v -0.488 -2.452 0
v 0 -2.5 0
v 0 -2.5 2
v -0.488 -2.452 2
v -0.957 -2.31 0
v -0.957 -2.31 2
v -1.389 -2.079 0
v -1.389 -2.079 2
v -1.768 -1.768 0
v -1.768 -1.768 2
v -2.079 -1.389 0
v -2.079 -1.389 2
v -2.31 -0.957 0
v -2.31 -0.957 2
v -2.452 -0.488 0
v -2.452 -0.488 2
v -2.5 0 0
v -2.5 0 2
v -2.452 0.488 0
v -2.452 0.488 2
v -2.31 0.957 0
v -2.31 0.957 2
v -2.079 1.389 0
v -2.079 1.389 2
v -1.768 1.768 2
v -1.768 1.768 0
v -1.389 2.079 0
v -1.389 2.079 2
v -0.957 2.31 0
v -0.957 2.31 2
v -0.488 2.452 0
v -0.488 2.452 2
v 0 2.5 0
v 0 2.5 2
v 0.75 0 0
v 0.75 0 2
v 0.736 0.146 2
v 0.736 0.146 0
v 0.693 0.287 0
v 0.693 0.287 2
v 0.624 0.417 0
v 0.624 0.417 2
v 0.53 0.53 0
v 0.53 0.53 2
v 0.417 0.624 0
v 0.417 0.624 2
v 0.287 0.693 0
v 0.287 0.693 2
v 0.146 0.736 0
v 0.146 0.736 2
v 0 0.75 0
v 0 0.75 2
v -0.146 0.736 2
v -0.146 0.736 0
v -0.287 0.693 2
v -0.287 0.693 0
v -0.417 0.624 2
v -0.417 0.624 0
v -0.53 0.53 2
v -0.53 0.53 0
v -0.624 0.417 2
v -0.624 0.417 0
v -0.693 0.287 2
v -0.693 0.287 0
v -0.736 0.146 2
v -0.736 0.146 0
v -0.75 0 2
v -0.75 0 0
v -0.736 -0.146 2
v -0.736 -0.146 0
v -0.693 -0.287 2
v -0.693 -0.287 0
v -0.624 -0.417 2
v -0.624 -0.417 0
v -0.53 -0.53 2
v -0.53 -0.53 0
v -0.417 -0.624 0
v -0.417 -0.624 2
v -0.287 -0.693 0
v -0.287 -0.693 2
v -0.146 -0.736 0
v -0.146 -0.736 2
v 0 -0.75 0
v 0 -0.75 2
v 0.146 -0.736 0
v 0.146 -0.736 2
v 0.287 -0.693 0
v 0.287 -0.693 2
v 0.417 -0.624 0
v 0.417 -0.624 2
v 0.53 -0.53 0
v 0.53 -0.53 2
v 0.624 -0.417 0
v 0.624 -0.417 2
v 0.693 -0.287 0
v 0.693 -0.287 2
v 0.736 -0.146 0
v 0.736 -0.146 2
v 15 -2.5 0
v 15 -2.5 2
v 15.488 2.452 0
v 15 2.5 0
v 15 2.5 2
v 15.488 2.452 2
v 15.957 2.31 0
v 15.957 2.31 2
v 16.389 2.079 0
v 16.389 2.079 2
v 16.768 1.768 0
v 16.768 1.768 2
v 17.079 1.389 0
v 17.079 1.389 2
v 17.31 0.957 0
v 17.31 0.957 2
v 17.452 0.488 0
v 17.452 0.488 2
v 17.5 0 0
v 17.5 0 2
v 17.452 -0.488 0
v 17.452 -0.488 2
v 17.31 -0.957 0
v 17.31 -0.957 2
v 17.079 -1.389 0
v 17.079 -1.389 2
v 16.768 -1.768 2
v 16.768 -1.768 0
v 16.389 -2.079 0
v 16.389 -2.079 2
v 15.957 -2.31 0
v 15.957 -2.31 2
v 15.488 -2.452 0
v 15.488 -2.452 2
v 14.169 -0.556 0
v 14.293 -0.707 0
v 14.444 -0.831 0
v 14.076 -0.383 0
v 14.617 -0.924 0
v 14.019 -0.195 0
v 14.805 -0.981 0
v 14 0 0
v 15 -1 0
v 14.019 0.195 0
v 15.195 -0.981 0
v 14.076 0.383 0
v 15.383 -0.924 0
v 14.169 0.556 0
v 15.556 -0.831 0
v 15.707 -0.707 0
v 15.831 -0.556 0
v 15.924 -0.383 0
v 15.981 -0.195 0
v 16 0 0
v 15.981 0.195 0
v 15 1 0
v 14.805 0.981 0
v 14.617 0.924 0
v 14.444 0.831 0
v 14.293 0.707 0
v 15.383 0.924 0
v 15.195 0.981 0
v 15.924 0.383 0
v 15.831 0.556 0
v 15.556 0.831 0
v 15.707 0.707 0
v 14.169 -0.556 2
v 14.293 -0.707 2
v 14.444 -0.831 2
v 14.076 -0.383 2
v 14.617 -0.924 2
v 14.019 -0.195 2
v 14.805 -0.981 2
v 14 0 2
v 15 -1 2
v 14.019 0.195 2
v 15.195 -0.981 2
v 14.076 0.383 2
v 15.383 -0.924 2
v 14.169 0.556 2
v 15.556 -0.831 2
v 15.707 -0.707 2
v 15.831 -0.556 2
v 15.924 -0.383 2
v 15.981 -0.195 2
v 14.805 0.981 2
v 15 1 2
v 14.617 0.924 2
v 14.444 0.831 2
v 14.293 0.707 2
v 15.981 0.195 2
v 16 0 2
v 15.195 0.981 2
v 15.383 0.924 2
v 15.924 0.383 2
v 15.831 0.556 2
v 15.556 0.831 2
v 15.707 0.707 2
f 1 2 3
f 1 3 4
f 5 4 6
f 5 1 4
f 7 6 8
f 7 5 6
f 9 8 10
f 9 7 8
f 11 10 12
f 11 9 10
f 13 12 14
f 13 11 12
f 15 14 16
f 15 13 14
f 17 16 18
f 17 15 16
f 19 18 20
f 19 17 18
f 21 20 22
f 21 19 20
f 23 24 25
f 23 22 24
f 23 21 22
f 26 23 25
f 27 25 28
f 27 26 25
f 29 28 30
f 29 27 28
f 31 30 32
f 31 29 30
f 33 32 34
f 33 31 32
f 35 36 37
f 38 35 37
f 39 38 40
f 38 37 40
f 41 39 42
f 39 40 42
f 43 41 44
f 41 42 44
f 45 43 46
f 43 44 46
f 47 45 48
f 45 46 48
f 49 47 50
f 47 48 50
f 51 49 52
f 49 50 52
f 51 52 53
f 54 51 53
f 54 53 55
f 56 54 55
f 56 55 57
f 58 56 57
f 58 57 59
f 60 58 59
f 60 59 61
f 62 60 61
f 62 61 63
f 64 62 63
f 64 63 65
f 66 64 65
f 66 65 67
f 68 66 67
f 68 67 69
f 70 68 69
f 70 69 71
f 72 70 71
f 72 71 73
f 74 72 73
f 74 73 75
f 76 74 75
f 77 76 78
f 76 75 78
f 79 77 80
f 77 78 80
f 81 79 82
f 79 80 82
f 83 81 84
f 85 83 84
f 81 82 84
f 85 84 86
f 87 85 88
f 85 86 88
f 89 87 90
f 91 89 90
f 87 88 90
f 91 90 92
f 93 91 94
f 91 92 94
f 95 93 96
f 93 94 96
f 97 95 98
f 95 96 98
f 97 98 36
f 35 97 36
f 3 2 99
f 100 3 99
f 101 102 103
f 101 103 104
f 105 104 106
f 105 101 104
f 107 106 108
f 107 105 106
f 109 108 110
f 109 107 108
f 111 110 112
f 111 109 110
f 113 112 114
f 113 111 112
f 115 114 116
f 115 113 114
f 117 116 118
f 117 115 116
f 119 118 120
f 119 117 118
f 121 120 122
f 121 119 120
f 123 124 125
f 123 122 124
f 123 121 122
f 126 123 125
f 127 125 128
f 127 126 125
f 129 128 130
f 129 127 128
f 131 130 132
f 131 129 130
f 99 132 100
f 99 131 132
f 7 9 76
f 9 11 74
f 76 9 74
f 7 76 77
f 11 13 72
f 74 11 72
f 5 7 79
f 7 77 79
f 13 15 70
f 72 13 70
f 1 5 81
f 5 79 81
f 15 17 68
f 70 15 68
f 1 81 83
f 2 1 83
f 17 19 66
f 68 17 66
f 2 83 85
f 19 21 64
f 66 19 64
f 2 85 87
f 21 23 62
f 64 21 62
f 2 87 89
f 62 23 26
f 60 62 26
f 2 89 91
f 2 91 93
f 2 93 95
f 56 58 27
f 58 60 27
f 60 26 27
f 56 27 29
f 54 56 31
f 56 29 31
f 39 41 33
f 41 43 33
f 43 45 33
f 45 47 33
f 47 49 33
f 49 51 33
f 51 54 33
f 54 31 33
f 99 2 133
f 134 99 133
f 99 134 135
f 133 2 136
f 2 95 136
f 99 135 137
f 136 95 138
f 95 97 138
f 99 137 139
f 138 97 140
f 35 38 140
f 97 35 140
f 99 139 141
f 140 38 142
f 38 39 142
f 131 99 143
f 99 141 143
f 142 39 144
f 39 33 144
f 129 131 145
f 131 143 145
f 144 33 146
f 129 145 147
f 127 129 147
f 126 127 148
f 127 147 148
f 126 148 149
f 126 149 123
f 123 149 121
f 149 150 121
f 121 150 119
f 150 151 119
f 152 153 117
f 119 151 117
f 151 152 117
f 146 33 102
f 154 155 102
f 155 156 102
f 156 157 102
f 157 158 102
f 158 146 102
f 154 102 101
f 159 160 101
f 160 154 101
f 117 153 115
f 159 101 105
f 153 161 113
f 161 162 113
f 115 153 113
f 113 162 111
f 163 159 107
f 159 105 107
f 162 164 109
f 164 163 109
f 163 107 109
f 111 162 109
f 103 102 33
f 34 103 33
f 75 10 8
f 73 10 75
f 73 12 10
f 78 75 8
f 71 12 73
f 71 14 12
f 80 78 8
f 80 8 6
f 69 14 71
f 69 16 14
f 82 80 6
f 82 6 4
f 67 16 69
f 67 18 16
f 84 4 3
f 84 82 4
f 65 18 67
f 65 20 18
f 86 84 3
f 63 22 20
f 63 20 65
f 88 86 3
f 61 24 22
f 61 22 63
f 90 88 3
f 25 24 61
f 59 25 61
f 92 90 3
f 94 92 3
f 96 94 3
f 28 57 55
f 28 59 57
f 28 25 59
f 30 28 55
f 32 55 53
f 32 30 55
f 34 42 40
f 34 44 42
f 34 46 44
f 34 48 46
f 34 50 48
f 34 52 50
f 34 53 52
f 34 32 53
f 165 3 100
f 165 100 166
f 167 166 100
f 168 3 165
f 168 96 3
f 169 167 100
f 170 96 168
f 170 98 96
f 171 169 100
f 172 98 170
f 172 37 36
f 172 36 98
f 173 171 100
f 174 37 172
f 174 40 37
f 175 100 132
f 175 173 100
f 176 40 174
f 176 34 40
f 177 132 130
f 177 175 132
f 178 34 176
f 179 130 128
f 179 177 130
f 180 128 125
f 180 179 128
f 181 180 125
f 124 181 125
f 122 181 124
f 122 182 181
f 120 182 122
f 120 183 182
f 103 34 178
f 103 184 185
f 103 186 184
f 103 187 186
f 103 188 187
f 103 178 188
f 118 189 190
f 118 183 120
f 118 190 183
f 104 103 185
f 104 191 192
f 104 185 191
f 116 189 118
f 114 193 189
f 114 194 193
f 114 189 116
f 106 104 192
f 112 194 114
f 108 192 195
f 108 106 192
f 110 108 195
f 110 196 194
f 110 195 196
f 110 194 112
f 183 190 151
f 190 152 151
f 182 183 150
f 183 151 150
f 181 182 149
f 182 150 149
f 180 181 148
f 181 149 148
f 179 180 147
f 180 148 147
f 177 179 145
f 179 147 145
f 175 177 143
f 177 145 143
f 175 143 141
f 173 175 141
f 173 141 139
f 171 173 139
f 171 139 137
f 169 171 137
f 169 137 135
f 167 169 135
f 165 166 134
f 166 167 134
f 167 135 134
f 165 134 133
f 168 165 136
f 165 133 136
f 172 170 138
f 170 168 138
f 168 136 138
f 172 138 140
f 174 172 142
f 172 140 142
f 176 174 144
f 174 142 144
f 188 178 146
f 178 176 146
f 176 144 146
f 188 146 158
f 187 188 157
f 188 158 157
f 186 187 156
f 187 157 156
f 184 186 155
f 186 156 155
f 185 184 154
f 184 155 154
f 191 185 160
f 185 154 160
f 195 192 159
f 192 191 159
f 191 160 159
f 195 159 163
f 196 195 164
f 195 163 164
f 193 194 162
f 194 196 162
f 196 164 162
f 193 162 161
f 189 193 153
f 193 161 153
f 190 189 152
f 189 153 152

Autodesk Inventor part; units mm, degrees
ref_plane "YZ Plane" through (0, 0, 0) normal (1, 0, 0) x (0, 1, 0)
ref_plane "XZ Plane" through (0, 0, 0) normal (0, 1, 0) x (-1, 0, 0)
ref_plane "XY Plane" through (0, 0, 0) normal (0, 0, 1) x (1, 0, 0)
sketch "Sketch1" plane through (0, 0, 0) normal (0, 0, 1) x (1, 0, 0)
  line L0 (0, 0) -> (15, 0) construction
  line L1 (0, -2.5) -> (15, -2.5)
  line L2 (15, 2.5) -> (0, 2.5)
  arc A0 (0, 2.5) -> (0, -2.5) centre (0, 0) ccw
  arc A1 (15, -2.5) -> (15, 2.5) centre (15, 0) ccw
  circle A2 centre (15, 0) radius 1
  circle A3 centre (0, 0) radius 1
  point P0 (7.5, 0)
  dimension "d0" = 15
  dimension "d1" = 5
  dimension "d2" = 2
  dimension "d3" = 2
extrude "Extrusion1" add sketch "Sketch1" along normal blind 2
sketch "Sketch2" plane through (0, 0, 2) normal (0, 0, 1) x (1, 0, 0)
  circle A0 centre (0, 0) radius 0.75
  circle A1 centre (0, 0) radius 1
  dimension "d6" = 1.5
extrude "Extrusion2" add sketch "Sketch2" against normal blind 2
properties part number "horn slider pen"
